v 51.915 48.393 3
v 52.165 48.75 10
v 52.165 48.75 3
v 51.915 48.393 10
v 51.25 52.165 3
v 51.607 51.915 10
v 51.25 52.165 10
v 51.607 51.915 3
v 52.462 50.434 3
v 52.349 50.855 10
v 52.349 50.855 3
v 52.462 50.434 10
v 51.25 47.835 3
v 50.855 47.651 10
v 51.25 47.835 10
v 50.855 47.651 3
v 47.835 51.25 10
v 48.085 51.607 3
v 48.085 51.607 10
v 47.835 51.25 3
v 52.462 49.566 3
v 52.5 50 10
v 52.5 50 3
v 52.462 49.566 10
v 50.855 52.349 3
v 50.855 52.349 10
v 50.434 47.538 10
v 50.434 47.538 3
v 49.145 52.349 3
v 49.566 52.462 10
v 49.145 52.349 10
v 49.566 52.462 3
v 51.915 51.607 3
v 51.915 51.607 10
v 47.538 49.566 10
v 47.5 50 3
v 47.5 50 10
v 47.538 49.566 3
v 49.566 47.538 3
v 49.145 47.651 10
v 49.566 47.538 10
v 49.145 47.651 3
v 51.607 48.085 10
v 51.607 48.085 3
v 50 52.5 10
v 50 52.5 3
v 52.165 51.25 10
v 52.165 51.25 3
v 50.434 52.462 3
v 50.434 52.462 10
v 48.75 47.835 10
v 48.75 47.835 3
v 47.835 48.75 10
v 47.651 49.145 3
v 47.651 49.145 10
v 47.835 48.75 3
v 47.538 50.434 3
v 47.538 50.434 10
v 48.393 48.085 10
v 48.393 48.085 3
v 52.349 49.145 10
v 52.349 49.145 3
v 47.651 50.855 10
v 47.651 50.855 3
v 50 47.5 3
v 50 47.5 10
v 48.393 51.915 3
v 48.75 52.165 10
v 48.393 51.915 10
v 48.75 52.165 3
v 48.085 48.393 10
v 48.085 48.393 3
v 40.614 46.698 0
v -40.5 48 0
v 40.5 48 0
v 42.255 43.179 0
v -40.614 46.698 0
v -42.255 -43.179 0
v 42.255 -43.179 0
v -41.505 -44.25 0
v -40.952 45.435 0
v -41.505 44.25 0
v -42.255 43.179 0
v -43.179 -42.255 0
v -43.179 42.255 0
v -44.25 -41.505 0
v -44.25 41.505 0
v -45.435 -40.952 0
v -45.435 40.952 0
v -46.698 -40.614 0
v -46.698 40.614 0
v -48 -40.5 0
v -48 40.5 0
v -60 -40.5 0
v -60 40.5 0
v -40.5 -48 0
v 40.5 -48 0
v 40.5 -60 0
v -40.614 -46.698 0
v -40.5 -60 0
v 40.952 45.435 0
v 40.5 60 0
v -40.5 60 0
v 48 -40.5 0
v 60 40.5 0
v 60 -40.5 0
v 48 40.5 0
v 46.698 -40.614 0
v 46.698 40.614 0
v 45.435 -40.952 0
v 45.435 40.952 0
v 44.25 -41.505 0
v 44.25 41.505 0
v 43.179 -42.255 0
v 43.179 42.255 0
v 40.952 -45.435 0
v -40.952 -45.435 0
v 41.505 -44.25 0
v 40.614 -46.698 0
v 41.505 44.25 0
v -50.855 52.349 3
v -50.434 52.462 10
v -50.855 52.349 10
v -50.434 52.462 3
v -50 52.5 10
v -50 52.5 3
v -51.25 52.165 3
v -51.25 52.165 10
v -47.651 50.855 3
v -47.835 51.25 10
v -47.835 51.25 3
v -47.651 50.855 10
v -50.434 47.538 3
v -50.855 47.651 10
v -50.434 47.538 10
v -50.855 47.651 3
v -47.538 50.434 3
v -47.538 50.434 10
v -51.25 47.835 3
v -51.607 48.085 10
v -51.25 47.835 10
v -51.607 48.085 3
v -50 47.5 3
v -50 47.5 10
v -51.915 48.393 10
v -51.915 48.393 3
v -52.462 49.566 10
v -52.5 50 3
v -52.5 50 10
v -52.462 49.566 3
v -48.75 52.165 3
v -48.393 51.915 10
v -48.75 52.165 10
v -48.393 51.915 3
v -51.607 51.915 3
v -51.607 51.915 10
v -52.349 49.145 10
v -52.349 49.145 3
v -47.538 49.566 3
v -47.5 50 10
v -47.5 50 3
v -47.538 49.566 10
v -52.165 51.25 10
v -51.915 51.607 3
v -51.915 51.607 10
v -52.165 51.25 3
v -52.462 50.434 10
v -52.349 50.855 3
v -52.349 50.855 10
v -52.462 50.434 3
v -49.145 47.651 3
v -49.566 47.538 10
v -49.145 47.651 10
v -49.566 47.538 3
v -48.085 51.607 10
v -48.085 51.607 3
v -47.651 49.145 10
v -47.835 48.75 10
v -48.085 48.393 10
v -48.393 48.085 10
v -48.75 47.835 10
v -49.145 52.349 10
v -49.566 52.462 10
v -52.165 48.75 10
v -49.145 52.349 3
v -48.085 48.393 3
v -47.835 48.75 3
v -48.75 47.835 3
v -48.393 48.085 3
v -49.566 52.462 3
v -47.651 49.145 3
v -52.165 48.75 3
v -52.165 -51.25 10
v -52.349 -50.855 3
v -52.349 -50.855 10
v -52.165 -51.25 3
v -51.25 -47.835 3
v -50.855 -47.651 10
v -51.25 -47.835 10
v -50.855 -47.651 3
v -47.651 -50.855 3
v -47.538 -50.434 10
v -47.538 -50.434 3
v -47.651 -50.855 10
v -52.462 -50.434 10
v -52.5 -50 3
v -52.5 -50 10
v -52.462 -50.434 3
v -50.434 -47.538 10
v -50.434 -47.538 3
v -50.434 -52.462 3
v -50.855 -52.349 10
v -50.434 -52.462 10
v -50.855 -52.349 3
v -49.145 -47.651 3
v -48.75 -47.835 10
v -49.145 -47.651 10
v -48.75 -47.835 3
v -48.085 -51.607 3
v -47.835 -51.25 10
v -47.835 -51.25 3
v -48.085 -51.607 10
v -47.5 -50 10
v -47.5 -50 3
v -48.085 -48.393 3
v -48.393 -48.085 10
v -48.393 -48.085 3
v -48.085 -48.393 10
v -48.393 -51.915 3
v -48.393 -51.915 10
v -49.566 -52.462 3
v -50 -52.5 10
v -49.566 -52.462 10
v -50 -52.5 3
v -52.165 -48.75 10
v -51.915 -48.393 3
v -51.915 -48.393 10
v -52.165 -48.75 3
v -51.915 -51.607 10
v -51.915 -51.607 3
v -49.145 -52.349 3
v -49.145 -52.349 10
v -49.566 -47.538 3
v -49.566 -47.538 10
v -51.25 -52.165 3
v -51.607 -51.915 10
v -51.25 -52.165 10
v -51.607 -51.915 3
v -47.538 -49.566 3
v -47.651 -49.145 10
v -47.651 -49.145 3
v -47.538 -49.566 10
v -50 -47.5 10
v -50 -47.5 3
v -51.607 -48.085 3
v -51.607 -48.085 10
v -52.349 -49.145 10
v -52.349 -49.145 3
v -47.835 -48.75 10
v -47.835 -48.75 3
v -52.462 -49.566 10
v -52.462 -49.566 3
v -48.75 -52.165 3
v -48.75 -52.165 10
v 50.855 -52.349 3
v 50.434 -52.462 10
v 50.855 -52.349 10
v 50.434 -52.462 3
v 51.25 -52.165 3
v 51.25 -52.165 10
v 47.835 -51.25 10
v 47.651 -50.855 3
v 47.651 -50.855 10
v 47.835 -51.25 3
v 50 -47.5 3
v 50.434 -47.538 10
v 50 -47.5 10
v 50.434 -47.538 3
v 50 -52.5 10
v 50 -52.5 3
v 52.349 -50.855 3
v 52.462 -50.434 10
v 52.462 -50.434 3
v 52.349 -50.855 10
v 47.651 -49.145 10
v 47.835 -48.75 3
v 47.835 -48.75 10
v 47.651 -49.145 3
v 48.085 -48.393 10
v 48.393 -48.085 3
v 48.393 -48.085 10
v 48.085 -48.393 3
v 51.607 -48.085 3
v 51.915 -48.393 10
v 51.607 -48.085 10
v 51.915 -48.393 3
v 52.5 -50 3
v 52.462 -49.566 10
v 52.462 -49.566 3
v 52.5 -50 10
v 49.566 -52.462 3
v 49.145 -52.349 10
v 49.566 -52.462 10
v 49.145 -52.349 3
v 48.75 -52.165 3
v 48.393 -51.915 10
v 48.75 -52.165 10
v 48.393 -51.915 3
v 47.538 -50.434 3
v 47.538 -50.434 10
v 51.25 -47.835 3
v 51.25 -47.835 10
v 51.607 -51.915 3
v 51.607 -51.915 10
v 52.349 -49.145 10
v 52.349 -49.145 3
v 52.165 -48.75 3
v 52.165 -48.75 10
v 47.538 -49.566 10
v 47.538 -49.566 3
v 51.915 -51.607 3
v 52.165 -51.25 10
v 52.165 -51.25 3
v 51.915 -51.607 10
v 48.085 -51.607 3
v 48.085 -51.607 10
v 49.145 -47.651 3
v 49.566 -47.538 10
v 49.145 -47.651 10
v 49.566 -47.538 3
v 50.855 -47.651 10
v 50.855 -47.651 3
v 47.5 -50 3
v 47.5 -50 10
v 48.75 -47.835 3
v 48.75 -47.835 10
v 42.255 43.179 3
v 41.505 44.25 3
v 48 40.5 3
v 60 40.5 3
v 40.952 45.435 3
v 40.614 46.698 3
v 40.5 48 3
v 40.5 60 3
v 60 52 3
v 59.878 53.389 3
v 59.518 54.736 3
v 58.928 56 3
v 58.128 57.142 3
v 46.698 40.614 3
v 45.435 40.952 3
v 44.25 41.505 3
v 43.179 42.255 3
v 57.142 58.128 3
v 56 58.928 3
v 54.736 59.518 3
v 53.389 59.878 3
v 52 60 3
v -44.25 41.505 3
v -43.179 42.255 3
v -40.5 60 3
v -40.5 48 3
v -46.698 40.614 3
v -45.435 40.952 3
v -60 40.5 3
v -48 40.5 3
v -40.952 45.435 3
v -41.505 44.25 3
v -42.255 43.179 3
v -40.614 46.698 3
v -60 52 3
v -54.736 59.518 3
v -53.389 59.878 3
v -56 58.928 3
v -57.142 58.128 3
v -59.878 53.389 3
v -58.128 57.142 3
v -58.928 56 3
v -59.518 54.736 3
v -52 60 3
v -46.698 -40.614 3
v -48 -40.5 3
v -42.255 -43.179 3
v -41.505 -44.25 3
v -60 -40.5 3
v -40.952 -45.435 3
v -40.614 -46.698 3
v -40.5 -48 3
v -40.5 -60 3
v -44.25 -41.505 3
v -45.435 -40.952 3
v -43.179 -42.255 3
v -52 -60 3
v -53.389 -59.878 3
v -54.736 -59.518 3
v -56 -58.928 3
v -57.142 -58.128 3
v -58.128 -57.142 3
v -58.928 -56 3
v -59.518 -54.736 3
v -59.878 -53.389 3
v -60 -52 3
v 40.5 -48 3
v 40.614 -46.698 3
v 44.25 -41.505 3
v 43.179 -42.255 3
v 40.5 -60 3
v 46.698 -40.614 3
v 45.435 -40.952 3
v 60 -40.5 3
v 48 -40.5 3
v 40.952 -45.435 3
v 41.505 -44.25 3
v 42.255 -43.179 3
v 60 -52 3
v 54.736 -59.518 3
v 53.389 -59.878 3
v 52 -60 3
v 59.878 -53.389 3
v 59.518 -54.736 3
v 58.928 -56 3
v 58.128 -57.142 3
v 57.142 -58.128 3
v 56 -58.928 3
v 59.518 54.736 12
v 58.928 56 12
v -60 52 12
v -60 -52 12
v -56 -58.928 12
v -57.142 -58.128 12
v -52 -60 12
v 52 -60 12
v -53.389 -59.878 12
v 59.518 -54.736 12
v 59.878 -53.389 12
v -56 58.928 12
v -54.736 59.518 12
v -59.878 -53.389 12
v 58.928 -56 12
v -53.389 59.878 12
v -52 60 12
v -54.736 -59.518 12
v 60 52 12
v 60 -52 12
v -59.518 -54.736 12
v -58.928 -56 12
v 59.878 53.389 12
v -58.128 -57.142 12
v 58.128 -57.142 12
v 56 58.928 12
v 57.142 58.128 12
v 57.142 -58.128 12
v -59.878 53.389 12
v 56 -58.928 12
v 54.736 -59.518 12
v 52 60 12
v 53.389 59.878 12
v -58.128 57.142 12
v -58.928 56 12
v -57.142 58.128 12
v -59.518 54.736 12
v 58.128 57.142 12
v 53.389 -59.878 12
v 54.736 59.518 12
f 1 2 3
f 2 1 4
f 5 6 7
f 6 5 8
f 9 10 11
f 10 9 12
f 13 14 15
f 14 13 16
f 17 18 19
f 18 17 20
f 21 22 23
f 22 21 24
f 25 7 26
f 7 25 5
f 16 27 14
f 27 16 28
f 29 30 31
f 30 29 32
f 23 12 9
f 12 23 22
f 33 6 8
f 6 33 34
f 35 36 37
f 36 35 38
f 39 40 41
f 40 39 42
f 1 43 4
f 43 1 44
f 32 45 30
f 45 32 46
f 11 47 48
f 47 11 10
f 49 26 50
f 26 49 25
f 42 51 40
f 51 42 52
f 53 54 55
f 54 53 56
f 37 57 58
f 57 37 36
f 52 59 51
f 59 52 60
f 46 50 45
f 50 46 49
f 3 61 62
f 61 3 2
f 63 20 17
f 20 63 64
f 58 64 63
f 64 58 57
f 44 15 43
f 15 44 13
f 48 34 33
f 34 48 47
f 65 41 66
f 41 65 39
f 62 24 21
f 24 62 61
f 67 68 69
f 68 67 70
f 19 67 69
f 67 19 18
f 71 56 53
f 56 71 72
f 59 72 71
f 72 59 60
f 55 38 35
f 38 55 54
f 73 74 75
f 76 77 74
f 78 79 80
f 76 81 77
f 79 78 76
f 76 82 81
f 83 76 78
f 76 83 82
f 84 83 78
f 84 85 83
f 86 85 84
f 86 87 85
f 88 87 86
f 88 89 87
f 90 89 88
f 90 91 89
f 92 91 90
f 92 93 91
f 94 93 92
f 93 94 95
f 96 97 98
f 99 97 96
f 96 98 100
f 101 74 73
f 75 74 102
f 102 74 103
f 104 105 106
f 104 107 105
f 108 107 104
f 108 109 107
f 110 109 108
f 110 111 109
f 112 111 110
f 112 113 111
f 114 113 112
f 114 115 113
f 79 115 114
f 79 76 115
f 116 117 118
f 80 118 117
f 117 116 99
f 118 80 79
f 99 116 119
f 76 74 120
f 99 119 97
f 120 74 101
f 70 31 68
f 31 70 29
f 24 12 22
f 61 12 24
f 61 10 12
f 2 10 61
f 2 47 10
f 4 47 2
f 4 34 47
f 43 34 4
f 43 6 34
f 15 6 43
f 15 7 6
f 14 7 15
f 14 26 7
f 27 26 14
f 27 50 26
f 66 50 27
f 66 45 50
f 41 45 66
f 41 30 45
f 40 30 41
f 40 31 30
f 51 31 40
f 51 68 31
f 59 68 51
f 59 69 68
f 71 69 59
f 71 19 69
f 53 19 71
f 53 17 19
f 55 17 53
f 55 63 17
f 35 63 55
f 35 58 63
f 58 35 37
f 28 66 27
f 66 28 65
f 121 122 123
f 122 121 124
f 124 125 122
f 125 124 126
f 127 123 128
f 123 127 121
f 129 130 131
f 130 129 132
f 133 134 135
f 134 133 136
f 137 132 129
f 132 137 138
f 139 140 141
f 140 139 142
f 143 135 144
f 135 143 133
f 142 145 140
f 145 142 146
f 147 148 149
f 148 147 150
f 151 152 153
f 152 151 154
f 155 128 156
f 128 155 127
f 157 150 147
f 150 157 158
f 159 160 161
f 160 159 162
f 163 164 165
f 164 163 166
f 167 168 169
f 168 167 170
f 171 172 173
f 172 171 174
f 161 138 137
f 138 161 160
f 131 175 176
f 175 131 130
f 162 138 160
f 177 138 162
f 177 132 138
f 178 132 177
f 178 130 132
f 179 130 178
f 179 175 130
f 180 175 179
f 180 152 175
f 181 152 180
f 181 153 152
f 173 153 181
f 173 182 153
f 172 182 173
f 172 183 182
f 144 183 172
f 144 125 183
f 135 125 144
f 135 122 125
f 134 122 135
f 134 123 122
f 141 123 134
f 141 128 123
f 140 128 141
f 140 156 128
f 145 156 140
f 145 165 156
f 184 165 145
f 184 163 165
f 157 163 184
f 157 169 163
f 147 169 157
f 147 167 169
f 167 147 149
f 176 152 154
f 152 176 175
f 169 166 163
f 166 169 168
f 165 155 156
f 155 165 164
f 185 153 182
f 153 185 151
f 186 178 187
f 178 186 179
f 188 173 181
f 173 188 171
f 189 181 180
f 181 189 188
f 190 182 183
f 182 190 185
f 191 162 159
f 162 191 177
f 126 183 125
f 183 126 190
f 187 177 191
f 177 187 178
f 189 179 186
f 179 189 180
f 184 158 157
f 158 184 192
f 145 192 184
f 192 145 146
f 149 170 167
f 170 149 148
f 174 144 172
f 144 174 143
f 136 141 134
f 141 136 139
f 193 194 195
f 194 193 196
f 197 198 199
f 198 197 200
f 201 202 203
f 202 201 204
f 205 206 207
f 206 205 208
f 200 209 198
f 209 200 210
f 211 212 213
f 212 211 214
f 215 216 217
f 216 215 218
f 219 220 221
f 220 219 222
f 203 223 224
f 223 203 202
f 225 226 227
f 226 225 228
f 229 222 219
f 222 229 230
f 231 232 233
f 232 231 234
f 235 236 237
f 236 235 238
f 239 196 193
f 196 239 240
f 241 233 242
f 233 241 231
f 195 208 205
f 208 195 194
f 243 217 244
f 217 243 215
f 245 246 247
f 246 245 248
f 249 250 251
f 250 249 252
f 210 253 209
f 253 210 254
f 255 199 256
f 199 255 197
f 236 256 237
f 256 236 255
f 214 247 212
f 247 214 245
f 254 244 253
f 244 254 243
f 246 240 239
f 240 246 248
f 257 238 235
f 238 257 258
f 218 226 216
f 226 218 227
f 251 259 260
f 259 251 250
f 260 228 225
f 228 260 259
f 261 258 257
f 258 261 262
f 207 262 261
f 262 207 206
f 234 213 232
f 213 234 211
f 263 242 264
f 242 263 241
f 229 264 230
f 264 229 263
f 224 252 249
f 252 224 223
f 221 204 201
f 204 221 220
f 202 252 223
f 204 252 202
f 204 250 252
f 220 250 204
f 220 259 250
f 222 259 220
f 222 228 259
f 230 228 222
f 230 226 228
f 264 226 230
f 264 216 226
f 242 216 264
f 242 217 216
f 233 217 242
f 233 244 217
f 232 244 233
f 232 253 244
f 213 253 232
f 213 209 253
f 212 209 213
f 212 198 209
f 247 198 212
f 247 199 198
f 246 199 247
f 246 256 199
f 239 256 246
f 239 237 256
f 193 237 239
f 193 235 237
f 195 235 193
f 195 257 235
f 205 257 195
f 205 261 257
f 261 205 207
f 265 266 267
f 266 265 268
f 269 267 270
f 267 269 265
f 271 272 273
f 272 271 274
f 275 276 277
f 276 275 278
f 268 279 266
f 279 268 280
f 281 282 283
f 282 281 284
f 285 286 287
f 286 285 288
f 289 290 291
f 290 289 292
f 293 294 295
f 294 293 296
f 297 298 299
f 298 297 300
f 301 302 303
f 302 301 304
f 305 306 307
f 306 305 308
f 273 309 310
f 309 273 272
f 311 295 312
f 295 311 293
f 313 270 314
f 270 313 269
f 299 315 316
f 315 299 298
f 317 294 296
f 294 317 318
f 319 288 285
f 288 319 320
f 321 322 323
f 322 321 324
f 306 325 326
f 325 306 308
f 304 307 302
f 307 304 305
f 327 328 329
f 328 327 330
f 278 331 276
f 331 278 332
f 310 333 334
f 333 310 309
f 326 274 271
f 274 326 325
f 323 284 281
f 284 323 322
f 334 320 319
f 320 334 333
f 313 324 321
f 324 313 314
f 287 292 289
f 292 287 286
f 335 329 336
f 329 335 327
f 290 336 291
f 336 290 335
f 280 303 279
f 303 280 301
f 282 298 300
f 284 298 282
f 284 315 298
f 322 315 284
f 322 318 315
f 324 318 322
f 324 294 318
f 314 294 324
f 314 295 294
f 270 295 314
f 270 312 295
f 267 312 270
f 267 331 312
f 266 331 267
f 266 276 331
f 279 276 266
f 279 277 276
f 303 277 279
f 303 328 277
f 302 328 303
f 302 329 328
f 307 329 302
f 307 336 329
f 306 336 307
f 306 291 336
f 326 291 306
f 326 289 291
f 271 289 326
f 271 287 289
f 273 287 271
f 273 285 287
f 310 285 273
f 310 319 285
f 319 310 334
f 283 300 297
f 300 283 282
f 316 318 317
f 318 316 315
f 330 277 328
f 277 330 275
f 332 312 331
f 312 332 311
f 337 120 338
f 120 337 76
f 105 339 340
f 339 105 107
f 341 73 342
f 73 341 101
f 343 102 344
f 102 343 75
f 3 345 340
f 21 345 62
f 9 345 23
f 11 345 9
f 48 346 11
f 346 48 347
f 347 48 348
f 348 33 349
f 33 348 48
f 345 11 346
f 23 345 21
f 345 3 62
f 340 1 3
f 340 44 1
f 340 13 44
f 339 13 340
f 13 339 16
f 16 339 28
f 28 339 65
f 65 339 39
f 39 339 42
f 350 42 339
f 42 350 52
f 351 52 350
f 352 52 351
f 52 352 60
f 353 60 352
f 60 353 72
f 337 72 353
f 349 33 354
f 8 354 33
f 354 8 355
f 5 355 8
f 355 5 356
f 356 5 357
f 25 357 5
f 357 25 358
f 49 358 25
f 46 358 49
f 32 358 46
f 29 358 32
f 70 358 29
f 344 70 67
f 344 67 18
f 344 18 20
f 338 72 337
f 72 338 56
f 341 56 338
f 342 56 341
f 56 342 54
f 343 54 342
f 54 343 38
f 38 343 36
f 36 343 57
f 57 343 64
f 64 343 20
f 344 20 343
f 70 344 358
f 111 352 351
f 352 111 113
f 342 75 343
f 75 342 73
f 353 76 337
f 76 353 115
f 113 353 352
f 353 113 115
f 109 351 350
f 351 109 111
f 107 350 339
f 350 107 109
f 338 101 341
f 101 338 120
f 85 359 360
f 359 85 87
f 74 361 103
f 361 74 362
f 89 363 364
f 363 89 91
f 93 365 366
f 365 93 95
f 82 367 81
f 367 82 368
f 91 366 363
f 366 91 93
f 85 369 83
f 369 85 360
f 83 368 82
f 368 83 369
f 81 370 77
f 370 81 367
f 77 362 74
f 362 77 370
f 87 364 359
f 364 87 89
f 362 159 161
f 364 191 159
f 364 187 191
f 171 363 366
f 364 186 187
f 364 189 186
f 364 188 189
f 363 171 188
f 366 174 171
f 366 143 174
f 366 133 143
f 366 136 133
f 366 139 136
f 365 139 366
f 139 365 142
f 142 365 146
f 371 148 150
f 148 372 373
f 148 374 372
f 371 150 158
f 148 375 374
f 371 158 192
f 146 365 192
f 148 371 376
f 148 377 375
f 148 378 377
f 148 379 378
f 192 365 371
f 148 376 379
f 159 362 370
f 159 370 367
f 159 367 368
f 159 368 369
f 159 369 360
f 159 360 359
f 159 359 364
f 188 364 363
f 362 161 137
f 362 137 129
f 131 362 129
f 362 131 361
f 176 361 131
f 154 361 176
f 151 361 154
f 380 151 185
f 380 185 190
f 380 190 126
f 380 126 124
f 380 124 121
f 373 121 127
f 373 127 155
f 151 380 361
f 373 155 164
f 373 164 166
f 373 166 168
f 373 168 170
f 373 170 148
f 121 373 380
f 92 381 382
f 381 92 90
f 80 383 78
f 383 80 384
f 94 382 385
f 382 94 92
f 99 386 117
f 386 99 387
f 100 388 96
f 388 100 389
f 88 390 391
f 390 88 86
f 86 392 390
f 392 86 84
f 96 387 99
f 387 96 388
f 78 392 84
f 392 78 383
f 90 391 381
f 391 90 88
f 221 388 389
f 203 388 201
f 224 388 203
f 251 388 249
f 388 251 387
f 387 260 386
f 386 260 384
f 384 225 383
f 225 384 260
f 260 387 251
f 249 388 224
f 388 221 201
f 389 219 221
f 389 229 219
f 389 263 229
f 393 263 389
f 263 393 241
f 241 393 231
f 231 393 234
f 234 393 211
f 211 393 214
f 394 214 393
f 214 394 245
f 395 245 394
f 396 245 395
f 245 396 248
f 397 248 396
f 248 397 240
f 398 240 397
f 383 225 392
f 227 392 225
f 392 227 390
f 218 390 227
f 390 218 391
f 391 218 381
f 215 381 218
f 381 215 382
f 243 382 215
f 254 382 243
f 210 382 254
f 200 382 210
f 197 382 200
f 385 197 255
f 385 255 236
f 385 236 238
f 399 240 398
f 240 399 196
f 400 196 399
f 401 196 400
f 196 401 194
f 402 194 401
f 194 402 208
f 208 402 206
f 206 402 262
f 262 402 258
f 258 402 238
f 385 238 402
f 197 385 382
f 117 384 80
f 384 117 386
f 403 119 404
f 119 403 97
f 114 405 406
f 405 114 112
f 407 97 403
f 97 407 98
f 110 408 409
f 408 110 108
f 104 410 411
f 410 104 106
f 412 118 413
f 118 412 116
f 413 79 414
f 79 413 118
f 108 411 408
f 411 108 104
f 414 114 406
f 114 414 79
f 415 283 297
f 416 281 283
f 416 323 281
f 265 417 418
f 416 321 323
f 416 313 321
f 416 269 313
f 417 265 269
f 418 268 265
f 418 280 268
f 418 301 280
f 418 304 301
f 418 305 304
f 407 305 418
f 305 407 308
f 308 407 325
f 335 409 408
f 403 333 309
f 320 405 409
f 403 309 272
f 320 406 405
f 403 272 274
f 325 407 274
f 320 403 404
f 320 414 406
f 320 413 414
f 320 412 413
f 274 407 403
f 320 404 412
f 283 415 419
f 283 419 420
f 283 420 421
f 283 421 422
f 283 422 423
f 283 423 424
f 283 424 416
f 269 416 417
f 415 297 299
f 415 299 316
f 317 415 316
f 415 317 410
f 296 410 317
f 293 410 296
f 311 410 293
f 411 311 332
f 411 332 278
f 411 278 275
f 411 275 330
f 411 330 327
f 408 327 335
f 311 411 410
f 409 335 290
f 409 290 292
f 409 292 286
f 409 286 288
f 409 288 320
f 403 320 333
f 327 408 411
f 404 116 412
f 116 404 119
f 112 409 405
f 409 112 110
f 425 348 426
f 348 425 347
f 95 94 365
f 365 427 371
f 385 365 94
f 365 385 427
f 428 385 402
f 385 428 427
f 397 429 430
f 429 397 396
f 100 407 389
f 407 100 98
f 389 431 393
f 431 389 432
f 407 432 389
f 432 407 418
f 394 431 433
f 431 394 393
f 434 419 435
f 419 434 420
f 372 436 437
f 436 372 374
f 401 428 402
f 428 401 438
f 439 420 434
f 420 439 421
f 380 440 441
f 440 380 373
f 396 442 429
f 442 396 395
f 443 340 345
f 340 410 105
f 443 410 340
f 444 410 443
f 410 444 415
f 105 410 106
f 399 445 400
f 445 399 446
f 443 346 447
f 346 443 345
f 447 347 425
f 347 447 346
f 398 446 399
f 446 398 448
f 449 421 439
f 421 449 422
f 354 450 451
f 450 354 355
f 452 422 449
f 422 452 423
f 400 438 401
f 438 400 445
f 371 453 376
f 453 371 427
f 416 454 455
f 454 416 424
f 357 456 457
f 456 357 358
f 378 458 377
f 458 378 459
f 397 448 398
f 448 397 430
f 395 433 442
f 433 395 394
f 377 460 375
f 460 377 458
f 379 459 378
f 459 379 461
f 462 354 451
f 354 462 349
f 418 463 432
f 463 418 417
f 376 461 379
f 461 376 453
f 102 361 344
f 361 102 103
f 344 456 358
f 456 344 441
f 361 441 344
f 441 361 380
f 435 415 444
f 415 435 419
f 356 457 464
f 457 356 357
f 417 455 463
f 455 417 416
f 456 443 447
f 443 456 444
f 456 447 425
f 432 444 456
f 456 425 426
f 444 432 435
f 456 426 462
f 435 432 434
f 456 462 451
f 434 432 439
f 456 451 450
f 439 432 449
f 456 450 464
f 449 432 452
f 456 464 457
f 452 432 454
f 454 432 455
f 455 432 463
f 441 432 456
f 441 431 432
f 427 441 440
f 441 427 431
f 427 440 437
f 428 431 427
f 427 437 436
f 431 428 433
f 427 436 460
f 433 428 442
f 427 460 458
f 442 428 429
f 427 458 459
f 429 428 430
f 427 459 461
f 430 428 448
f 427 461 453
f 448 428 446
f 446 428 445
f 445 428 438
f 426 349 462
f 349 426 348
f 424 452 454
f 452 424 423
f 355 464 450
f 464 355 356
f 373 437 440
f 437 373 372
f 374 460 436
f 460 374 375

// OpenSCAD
$fn=36;
//122 mm
module vesa1()
{
	difference()
	{
		linear_extrude(height=7)
		{
			vesa_soft=5;
			minkowski()
			{
				square([120-vesa_soft*2, 120-vesa_soft*2], center=true);
				circle(r=vesa_soft);
			}
		}
		for(r=[0:90:359])
		{
			rotate([0, 0, r]) translate([50, 50, 0]) cylinder(d=5, h=10);
		}
	}
}

module vesa2()
{
	difference()
	{
		translate([0, 0, -(5+9)]) linear_extrude(height=5+9)
		{
			vesa_soft=5;
			minkowski()
			{
				square([230-vesa_soft*2, 150-vesa_soft*2], center=true);
				circle(r=vesa_soft);
			}
		}
		translate([ 100, 65, 0]) cylinder(d=5, h=40, center=true);
		translate([ 100,  0, 0]) cylinder(d=5, h=40, center=true);
		translate([-100,  0, 0]) cylinder(d=5, h=40, center=true);
		translate([-100, 65, 0]) cylinder(d=5, h=40, center=true);
		
	}
}

module vesa()
{
	difference()
	{
		linear_extrude(height=12)
		{
			vesa_soft=8;
			minkowski()
			{
				square([120-vesa_soft*2, 120-vesa_soft*2], center=true);
				circle(r=vesa_soft);
			}
		}
		for(r=[0:90:359])
		{
			rotate([0, 0, r]) translate([50, 50, 0]) cylinder(d=5, h=10);
		}
		
		for(r2=[0:90:359])
		{
			rotate([0, 0, r2])
			{
				translate([78, 78, 0])
				{
					hull()
					{
						for(r=[0:90:359])
						{
							rotate([0, 0, r])	translate([30, 30, 0]) cylinder(d=15, h=3, center=false);
						}
					}
				}
			}
		}
	}
}

//translate([0, 15+122, 0]) vesa1();
//vesa2();

vesa();

//translate([65, 0, 0]) cube([3, 83, 3], center=true);
